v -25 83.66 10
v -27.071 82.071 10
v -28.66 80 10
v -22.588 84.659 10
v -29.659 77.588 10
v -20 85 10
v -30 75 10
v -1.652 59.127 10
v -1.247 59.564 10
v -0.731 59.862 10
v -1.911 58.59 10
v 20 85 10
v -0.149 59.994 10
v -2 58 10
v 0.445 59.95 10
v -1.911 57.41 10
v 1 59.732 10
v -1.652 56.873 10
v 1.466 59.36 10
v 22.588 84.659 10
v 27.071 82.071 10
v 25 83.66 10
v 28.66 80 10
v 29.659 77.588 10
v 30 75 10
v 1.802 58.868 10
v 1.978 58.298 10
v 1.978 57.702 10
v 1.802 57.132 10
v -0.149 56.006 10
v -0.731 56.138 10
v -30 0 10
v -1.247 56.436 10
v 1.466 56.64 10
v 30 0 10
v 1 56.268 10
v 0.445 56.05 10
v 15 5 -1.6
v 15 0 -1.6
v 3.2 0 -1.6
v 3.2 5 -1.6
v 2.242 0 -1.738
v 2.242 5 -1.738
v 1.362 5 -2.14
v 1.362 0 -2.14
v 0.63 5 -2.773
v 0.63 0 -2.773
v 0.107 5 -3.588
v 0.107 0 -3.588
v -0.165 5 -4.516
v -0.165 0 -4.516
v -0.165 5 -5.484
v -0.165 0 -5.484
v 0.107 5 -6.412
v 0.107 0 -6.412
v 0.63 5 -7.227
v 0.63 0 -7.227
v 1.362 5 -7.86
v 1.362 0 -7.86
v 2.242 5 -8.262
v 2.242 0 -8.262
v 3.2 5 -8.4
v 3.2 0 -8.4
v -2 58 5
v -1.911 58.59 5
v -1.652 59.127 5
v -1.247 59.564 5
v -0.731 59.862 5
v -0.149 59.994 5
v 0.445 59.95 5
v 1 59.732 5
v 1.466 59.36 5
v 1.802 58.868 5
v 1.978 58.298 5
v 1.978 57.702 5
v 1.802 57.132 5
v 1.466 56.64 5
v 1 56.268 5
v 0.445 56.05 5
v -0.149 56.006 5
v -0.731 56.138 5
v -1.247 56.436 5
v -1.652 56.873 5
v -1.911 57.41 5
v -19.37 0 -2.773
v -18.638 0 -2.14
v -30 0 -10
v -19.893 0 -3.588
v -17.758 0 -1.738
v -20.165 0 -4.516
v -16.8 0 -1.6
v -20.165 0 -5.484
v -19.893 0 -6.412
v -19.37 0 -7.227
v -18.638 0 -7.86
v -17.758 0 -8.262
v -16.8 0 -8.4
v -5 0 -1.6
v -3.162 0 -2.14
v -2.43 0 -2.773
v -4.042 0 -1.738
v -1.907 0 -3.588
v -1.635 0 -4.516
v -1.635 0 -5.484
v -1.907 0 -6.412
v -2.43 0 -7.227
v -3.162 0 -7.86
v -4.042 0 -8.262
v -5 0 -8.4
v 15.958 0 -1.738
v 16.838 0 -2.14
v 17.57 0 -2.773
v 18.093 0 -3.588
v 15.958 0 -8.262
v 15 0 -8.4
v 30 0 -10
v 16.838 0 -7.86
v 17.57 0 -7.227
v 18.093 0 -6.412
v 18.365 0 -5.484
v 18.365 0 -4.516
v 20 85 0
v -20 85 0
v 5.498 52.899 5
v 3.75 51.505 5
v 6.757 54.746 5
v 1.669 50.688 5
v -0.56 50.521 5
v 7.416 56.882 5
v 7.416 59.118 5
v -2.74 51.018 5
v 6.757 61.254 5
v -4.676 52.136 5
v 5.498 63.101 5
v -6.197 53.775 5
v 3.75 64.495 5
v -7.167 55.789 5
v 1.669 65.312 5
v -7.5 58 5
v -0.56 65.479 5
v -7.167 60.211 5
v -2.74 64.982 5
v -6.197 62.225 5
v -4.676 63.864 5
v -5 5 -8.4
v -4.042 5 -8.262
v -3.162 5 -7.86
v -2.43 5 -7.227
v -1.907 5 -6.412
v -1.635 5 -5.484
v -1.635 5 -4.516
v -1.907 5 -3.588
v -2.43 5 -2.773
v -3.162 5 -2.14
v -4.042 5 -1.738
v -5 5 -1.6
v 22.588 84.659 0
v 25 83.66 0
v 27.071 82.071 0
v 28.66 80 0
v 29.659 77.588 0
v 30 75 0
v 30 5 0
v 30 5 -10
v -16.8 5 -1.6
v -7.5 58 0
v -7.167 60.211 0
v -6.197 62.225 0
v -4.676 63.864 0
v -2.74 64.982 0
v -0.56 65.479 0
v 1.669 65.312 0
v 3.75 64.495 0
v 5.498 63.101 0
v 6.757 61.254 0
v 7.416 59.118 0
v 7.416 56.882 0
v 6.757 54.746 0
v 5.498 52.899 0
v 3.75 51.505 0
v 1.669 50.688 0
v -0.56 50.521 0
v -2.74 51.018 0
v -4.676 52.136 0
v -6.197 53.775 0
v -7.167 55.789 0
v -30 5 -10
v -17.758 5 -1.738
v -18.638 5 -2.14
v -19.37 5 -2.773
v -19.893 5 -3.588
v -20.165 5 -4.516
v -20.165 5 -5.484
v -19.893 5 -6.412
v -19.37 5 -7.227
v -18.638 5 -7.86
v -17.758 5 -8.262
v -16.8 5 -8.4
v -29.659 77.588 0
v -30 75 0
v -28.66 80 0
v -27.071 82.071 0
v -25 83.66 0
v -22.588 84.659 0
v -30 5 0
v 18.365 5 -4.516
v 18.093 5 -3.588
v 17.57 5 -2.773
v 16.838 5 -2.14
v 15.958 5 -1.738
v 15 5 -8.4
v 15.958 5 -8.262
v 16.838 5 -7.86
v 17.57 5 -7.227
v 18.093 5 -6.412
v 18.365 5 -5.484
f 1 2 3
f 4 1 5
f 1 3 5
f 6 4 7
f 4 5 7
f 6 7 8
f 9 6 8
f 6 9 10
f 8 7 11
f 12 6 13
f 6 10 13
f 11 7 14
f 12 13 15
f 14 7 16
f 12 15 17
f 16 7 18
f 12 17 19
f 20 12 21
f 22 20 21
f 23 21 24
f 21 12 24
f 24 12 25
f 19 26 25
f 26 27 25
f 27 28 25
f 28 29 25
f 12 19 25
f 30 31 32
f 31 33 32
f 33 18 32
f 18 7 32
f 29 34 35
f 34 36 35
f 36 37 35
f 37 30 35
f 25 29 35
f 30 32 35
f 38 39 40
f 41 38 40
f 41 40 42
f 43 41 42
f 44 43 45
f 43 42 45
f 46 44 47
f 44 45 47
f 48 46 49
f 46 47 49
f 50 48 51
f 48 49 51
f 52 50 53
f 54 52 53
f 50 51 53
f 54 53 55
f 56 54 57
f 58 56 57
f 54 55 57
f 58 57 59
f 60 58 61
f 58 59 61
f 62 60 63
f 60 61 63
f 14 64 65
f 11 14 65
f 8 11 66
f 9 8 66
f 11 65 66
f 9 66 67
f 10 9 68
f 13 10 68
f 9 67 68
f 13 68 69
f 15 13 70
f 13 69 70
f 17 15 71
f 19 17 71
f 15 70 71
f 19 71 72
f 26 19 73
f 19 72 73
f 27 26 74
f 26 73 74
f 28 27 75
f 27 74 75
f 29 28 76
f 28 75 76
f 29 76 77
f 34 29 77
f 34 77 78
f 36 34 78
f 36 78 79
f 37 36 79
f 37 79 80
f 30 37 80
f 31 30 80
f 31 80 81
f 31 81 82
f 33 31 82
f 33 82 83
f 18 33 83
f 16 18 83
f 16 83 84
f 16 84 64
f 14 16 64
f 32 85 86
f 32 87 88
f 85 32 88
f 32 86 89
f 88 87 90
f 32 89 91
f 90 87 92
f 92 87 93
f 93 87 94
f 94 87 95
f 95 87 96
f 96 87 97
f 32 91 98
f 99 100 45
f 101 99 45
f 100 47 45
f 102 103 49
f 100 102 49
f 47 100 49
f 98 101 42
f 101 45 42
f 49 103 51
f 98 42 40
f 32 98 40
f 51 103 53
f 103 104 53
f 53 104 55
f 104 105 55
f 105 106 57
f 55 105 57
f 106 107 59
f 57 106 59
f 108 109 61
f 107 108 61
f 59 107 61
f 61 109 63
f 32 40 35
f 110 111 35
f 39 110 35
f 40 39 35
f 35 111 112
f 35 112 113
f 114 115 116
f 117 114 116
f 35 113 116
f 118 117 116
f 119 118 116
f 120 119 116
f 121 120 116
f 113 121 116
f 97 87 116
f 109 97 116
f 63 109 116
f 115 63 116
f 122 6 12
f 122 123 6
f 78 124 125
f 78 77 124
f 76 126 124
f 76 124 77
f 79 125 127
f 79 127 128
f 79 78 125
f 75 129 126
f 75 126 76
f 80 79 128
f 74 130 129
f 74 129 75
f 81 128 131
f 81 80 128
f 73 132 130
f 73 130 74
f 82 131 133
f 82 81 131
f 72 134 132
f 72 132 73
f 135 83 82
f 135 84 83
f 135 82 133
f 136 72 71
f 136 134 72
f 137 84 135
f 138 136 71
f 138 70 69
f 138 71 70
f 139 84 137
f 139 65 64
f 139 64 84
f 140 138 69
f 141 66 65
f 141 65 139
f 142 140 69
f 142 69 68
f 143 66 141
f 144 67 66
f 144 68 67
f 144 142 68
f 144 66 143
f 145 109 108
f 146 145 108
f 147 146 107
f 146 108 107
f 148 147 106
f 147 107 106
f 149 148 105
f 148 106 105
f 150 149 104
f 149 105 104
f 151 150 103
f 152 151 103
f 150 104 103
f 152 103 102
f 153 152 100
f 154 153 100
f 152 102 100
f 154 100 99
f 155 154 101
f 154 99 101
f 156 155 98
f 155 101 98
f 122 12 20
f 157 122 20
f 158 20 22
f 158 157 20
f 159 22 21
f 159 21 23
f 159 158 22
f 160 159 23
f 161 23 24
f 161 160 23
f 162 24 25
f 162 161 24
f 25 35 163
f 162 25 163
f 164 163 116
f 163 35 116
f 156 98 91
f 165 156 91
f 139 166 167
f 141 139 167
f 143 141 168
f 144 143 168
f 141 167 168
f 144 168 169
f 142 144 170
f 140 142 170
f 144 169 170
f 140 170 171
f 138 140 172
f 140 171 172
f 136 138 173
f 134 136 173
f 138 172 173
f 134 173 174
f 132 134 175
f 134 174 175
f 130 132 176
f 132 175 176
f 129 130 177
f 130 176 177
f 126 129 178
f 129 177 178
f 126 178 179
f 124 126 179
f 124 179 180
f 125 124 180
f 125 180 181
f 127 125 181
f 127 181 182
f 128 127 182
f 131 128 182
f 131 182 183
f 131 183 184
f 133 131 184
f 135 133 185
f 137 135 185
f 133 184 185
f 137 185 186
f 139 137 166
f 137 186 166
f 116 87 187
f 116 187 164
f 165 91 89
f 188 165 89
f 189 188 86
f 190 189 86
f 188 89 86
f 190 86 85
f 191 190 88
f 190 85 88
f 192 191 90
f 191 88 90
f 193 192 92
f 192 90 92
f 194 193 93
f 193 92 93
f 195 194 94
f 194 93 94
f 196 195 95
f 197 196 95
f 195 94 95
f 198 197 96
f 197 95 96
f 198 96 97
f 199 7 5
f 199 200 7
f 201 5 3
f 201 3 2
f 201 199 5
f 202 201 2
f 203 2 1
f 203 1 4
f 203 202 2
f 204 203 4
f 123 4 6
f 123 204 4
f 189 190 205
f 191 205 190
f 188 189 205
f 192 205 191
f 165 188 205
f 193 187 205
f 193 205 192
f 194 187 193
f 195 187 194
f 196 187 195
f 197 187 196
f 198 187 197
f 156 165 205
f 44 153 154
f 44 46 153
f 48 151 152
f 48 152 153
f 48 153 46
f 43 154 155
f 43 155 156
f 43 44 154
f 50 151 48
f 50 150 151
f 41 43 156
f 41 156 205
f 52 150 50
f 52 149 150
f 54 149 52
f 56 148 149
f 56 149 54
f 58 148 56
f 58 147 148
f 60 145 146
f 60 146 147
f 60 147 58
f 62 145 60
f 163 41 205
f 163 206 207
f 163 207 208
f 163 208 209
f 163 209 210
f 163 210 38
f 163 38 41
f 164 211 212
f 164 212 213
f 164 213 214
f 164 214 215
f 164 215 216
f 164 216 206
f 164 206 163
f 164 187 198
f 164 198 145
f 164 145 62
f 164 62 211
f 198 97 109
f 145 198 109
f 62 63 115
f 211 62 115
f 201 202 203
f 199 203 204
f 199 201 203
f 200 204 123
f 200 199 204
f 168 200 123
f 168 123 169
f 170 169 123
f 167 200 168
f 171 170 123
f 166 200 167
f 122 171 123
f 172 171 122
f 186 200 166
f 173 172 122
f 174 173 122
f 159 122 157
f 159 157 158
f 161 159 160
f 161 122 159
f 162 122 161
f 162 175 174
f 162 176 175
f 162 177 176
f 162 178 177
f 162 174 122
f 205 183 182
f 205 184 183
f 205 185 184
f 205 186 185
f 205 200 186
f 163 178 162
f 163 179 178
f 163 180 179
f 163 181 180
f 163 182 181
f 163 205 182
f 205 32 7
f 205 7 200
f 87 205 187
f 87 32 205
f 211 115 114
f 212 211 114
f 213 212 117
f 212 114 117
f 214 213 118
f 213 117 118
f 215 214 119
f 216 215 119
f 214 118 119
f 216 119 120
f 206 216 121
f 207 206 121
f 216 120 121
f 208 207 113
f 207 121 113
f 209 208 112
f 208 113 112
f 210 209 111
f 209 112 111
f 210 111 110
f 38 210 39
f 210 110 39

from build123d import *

# Parameters (mm, degrees)
SKETCH1_W           = 60
SKETCH1_H           = 20
BOSS_EXTRUDE1_DEPTH = 5
SKETCH2_W           = 60
SKETCH2_H           = 10
BOSS_EXTRUDE2_DEPTH = 80
SKETCH3_R           = 7.5
CUT_EXTRUDE1_DEPTH  = 5
FILLET1_R           = 10
SKETCH4_R           = 2
CUT_EXTRUDE2_DEPTH  = 92.378334412


with BuildPart() as part:
    # Sketch1 → Boss-Extrude1 (new body)
    with BuildSketch(Plane(origin=(0, 0, 0), x_dir=(1, 0, 0), z_dir=(0, 1, 0))):
        Rectangle(SKETCH1_W, SKETCH1_H)
        with BuildLine():
            Line((-16.8, 8.4), (-5, 8.4))
            ThreePointArc((-5, 8.4), (-1.6, 5), (-5, 1.6))
            Line((-5, 1.6), (-16.8, 1.6))
            ThreePointArc((-16.8, 1.6), (-20.2, 5), (-16.8, 8.4))
        make_face(mode=Mode.SUBTRACT)
        with BuildLine():
            Line((3.2, 8.4), (15, 8.4))
            ThreePointArc((15, 8.4), (18.4, 5), (15, 1.6))
            Line((15, 1.6), (3.2, 1.6))
            ThreePointArc((3.2, 1.6), (-0.2, 5), (3.2, 8.4))
        make_face(mode=Mode.SUBTRACT)
    extrude(amount=BOSS_EXTRUDE1_DEPTH)

    # Sketch2 → Boss-Extrude2 (add)
    with BuildSketch(Plane(origin=(0, 5, 0), x_dir=(1, 0, 0), z_dir=(0, 1, 0))):
        with Locations((0, -5)):
            Rectangle(SKETCH2_W, SKETCH2_H)
    extrude(amount=BOSS_EXTRUDE2_DEPTH)

    # Sketch3 → Cut-Extrude1 (cut)
    with BuildSketch(Plane(origin=(0, 0, 0), x_dir=(-1, 0, 0), z_dir=(0, 0, -1))):
        with Locations((0, 58)):
            Circle(SKETCH3_R)
    extrude(amount=-CUT_EXTRUDE1_DEPTH, mode=Mode.SUBTRACT)

    # Fillet1
    fillet1_edges = [part.edges().sort_by_distance(p)[0] for p in [
        (30, 85, 5),
        (-30, 85, 5),
    ]]
    fillet(fillet1_edges, radius=FILLET1_R)

    # Sketch4 → Cut-Extrude2 (cut, through all)
    with BuildSketch(Plane(origin=(0, 0, 5), x_dir=(-1, 0, 0), z_dir=(0, 0, -1))):
        with Locations((0, 58)):
            Circle(SKETCH4_R)
    extrude(amount=-CUT_EXTRUDE2_DEPTH, mode=Mode.SUBTRACT)


solid = part.part
